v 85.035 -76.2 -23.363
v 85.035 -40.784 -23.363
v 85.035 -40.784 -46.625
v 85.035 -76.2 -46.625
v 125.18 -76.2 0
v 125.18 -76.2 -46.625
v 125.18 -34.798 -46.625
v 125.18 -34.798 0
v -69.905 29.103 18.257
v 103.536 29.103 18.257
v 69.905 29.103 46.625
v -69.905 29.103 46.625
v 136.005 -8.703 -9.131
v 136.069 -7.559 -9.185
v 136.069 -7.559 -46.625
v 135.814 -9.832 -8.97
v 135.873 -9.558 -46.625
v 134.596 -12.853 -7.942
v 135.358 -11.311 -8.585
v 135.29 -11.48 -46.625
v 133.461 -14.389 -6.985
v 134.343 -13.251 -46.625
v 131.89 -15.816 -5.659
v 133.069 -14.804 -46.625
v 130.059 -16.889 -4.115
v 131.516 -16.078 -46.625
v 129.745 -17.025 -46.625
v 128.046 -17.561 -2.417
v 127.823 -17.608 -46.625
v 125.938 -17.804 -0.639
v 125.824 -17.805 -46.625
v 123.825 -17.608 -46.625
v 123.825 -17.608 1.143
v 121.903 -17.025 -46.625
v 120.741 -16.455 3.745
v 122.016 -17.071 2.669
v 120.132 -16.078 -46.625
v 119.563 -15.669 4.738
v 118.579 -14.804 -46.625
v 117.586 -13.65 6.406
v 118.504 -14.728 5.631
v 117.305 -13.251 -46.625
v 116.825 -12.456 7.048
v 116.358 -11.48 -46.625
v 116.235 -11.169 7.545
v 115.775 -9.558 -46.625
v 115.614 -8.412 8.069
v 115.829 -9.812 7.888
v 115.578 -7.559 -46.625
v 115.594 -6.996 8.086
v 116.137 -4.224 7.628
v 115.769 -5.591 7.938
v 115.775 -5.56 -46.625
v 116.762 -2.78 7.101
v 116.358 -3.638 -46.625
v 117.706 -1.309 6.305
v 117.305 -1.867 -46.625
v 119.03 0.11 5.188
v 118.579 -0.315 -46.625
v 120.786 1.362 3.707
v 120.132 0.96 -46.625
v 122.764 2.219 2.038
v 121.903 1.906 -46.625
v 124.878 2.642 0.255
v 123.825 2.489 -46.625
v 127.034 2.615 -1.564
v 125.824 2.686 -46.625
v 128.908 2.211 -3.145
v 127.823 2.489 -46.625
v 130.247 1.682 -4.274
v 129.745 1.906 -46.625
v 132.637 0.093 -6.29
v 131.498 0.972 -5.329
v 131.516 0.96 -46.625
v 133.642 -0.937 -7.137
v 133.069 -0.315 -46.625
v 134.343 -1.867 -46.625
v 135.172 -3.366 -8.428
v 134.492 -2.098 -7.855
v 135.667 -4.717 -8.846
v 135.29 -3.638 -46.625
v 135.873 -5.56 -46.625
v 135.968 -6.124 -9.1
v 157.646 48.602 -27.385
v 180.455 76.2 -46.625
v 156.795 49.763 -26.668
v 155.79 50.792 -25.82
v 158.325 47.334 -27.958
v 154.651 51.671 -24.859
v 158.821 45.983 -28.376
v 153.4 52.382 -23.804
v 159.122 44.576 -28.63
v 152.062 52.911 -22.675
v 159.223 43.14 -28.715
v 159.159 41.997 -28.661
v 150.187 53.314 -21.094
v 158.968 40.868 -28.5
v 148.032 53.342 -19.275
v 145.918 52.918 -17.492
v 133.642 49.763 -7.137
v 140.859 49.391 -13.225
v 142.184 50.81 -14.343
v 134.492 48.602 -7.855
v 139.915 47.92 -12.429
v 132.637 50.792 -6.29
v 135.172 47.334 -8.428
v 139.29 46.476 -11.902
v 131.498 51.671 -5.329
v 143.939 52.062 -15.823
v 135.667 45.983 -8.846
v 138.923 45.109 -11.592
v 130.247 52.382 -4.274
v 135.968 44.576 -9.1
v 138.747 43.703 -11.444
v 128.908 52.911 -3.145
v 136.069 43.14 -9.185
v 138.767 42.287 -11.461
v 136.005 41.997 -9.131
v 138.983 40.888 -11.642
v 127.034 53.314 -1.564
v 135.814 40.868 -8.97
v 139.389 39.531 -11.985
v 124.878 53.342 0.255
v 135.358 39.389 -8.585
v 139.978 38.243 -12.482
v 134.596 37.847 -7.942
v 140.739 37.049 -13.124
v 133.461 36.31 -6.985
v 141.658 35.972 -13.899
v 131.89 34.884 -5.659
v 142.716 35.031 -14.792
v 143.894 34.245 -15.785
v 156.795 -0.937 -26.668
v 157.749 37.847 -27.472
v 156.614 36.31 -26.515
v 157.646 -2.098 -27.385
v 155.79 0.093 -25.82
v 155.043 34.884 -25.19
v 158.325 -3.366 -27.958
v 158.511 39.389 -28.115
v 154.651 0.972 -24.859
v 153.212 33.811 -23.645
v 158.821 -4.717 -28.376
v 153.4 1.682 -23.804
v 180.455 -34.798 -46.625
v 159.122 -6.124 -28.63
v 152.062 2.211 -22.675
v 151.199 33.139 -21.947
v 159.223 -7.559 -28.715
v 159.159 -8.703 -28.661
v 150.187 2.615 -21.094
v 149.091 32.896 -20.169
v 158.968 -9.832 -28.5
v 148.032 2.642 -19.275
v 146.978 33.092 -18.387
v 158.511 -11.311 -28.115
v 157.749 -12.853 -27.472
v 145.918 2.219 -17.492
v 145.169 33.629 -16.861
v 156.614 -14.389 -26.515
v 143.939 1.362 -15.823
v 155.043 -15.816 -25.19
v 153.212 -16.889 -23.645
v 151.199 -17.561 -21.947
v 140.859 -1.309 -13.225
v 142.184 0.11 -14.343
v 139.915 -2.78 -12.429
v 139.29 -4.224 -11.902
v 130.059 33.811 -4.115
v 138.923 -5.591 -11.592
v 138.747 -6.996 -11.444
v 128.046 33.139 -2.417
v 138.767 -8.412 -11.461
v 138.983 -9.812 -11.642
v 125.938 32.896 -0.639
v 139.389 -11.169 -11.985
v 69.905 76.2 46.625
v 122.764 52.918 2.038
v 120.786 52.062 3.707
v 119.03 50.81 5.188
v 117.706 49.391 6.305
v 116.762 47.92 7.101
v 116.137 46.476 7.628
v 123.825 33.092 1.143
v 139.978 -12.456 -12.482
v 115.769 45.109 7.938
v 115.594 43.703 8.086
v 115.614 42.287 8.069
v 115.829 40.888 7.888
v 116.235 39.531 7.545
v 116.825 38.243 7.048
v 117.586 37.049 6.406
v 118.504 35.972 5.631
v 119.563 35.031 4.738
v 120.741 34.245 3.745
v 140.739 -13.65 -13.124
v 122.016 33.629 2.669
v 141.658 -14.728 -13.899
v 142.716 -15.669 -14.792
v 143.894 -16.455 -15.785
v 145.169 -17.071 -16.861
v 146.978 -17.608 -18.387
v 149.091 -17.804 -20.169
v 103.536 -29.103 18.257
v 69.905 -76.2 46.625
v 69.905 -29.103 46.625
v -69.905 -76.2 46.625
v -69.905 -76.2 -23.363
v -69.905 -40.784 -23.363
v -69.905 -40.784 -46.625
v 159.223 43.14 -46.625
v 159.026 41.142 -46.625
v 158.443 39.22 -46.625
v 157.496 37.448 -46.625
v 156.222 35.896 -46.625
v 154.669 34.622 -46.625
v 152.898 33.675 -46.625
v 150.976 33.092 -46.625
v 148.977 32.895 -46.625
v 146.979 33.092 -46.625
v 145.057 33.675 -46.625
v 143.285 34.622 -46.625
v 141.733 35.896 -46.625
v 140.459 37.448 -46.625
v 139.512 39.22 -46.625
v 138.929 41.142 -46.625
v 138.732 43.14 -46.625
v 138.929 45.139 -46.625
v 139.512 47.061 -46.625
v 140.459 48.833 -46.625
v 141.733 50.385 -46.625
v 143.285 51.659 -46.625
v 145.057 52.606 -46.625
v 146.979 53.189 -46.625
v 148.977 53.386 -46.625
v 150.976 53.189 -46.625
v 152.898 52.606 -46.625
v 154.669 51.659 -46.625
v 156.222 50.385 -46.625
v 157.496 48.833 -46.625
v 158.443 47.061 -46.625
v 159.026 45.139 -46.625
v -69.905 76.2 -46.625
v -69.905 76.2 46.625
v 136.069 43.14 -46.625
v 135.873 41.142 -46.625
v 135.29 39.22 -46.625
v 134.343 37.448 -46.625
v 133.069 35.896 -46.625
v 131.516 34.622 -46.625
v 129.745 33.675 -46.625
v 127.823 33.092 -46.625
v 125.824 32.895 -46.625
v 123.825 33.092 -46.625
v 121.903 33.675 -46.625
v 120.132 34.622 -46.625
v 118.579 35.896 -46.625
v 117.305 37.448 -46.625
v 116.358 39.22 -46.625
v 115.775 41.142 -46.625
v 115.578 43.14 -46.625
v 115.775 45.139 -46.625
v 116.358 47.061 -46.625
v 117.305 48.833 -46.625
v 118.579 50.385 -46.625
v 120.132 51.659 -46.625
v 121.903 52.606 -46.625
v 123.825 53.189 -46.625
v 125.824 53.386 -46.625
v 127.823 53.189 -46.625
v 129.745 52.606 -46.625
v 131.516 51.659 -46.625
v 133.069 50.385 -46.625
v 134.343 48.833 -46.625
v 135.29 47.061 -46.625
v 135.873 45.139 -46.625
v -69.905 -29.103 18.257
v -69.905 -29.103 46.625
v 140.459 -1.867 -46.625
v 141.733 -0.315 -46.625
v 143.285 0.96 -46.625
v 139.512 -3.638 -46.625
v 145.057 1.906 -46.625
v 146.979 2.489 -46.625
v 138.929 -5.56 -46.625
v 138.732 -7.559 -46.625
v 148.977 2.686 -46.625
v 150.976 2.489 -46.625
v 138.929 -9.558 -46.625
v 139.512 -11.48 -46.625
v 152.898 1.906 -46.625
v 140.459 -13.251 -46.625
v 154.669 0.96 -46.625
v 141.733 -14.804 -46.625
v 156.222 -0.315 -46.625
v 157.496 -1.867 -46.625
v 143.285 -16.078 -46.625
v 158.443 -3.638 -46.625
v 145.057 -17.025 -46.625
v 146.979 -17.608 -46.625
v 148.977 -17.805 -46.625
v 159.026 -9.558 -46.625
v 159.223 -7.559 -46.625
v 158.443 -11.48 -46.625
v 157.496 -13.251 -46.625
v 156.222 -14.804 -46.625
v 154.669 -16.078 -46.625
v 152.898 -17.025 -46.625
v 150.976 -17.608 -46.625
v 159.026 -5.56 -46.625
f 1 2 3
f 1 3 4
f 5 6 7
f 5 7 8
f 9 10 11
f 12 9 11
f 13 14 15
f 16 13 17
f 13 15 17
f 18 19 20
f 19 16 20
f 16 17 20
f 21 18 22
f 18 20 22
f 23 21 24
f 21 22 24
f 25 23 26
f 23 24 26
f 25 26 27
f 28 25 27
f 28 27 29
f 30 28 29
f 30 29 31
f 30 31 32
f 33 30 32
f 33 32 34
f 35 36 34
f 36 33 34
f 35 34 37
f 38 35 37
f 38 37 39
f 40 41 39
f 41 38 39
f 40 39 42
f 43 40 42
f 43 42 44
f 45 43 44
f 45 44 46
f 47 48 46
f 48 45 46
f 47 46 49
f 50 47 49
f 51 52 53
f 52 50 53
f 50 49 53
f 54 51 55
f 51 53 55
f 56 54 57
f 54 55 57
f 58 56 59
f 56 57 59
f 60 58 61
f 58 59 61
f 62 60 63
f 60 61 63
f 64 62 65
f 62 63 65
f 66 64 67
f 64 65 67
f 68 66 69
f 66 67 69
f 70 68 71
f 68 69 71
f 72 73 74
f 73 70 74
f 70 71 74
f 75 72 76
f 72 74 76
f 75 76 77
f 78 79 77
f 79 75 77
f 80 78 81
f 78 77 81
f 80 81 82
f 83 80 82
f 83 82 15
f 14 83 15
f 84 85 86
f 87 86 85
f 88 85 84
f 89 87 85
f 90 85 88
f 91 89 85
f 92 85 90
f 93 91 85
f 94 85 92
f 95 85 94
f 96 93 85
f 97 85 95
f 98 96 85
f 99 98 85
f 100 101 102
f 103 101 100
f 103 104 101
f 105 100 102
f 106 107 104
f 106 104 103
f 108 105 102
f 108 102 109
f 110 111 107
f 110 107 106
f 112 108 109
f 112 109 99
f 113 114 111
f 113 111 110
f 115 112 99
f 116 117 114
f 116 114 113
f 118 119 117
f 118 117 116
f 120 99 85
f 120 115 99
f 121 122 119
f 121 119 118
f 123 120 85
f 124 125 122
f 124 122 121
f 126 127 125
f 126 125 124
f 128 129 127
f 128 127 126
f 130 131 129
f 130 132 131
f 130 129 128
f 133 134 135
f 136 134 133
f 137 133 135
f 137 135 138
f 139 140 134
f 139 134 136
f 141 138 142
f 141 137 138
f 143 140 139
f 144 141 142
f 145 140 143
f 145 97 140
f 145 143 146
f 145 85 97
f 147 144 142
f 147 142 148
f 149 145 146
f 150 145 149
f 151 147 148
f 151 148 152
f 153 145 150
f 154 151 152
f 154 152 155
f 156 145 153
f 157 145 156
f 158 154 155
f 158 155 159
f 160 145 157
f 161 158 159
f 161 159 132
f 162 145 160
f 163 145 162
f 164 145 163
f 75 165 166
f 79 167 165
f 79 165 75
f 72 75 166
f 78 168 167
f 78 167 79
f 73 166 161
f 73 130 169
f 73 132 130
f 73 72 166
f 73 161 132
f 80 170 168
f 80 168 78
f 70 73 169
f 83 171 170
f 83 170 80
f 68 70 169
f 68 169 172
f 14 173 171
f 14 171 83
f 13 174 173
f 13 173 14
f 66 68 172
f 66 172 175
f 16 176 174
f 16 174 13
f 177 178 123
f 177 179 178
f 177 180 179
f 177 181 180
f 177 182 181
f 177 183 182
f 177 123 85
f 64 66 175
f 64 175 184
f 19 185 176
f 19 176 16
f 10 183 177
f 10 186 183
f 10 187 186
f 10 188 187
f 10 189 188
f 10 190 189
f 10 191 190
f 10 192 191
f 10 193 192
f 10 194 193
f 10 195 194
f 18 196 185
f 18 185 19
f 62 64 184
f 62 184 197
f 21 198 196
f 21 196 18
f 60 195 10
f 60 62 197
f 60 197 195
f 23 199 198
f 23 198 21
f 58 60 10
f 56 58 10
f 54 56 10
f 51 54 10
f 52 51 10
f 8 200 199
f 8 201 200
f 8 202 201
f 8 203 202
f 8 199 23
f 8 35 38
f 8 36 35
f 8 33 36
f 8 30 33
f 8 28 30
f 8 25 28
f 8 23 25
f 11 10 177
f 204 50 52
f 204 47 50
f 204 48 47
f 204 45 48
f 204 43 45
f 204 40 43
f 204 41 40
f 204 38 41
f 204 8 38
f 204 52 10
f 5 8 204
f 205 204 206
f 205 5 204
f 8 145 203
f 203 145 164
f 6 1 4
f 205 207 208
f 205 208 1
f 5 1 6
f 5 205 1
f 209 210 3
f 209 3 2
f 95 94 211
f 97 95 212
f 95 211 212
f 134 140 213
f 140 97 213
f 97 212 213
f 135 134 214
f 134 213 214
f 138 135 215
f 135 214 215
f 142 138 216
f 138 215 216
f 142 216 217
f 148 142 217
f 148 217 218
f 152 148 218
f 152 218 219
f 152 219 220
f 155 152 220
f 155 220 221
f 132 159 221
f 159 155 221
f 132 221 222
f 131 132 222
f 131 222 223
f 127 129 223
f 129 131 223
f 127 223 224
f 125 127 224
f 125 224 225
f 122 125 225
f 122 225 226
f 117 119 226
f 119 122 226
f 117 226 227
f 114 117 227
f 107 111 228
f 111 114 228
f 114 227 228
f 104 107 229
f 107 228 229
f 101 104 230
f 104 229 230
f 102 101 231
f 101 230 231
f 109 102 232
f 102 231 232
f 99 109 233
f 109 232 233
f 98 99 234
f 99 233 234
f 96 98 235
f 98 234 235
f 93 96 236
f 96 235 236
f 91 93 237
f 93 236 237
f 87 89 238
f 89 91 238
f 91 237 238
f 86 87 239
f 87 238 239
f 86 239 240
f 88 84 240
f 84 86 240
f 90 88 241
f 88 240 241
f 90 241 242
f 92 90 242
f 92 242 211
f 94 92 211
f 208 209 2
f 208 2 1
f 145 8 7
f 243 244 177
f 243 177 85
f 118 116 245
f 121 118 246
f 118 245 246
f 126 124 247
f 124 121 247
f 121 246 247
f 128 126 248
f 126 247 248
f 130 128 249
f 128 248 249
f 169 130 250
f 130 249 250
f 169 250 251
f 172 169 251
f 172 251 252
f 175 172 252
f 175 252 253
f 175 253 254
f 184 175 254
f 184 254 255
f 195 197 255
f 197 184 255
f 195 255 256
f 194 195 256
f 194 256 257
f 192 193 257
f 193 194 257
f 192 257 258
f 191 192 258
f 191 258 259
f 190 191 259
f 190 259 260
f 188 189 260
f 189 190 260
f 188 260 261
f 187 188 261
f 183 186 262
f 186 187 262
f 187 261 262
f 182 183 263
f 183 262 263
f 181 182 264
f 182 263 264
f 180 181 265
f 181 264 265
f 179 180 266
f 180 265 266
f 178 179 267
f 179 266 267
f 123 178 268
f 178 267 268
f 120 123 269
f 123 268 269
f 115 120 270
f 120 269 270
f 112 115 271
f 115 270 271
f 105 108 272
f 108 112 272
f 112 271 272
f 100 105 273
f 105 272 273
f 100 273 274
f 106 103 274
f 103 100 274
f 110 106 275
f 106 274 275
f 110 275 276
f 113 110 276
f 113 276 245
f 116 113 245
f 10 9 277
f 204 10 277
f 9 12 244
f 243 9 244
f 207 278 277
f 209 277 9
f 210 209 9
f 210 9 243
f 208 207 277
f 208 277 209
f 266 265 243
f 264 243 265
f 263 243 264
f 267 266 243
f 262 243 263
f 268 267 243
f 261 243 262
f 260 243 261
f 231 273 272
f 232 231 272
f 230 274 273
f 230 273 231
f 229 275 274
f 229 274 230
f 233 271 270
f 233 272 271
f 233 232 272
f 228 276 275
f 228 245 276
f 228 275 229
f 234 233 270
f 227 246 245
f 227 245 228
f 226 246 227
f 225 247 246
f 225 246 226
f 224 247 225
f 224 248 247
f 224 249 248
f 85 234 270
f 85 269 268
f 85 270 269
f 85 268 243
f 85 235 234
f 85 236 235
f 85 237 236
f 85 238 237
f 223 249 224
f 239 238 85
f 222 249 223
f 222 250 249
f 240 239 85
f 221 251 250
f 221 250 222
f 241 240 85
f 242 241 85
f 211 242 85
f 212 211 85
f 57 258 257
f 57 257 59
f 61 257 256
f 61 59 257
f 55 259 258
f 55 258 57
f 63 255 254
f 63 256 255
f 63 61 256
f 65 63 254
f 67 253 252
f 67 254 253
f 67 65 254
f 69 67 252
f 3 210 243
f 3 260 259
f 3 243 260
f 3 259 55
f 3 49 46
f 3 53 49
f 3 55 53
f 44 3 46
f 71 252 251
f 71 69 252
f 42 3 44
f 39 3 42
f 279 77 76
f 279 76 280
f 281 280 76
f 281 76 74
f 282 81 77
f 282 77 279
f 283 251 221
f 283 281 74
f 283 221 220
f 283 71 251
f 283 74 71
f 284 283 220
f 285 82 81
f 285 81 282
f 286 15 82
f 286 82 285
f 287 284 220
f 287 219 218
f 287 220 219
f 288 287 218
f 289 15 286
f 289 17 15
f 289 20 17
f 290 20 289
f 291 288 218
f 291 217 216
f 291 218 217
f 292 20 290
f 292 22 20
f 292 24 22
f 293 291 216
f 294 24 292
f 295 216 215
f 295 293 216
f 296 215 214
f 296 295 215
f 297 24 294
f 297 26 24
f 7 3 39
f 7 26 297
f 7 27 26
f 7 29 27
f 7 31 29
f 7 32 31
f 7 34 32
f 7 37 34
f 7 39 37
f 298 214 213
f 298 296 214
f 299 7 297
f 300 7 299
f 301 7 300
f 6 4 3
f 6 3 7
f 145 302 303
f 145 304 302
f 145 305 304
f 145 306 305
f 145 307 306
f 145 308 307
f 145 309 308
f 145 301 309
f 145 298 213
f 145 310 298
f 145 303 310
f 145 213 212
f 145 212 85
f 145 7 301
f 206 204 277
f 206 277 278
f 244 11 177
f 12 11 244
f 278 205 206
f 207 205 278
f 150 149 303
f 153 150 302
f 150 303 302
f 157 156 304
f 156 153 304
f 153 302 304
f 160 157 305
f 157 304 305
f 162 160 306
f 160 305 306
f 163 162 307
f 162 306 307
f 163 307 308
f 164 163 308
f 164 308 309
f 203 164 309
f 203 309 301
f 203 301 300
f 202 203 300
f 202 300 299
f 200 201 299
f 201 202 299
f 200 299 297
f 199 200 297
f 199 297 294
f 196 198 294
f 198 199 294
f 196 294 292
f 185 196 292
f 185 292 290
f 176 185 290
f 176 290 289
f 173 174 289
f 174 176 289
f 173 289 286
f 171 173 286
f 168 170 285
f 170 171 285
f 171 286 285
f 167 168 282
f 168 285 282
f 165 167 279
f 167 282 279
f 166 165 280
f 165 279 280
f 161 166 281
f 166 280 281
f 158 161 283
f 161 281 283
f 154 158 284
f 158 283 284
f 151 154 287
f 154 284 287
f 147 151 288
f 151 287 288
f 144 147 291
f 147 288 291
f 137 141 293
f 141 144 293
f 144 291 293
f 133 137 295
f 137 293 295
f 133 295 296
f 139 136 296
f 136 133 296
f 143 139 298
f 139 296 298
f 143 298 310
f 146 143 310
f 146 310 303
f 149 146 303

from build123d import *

# Parameters (mm, degrees)
F1_DEPTH  = 76.2
F3_W      = 58.20692
F3_H      = 57.454397
F4_DEPTH  = 215.138
F6_DEPTH  = 154.686
F7_W      = 56.875151
F7_H      = 62.153444
F8_DEPTH  = 41.402
F9_W      = 44.515941
F9_H      = 35.404432
F10_DEPTH = 154.94
F11_R     = 10.245483
F12_DEPTH = 93.251692


with BuildPart() as f1:
    # F0 (on Front) → F1 (new body, symmetric)
    with BuildSketch(Plane.XZ):
        Polygon((69.90508, 46.625346), (-69.90508, 46.625346), (-69.90508, -46.625346), (69.90508, -46.625346), (180.455416, -46.625346), align=None)
    extrude(amount=F1_DEPTH, both=True)

    # F3 (on face) → F4 (cut)
    with BuildSketch(Plane(origin=(-69.90508, 0, 0), x_dir=(0, -1, 0), z_dir=(-1, 0, 0))):
        with Locations((0, 46.984415)):
            Rectangle(F3_W, F3_H)
    extrude(amount=-F4_DEPTH, mode=Mode.SUBTRACT)

    # F5 (on face) → F6 (cut)
    with BuildSketch(Plane.XZ.offset(76.2)):
        Polygon((185.93514, 8.272756), (115.37275, 8.272756), (180.455416, -46.625346), (115.37275, -46.625346), (115.37275, -61.852183), (185.93514, -61.852183), align=None)
    extrude(amount=-F6_DEPTH, mode=Mode.SUBTRACT)

    # F7 (on face) → F8 (cut)
    with BuildSketch(Plane.XZ.offset(76.2)):
        with Locations((153.617823, -31.076722)):
            Rectangle(F7_W, F7_H)
    extrude(amount=-F8_DEPTH, mode=Mode.SUBTRACT)

    # F9 (on face) → F10 (cut)
    with BuildSketch(Plane(origin=(-69.90508, 0, 0), x_dir=(0, -1, 0), z_dir=(-1, 0, 0))):
        with Locations((63.042035, -41.065147)):
            Rectangle(F9_W, F9_H)
    extrude(amount=-F10_DEPTH, mode=Mode.SUBTRACT)

    # F11 (on face) → F12 (cut, through all)
    with BuildSketch(Plane(origin=(0, 0, -46.625346), x_dir=(1, 0, 0), z_dir=(0, 0, -1))):
        with Locations((148.977362, 7.559244)):
            Circle(F11_R)
        with Locations((148.977362, -43.140469)):
            Circle(F11_R)
        with Locations((125.823924, 7.559244)):
            Circle(F11_R)
        with Locations((125.823924, -43.140469)):
            Circle(F11_R)
    extrude(amount=-F12_DEPTH, mode=Mode.SUBTRACT)


solid = f1.part
